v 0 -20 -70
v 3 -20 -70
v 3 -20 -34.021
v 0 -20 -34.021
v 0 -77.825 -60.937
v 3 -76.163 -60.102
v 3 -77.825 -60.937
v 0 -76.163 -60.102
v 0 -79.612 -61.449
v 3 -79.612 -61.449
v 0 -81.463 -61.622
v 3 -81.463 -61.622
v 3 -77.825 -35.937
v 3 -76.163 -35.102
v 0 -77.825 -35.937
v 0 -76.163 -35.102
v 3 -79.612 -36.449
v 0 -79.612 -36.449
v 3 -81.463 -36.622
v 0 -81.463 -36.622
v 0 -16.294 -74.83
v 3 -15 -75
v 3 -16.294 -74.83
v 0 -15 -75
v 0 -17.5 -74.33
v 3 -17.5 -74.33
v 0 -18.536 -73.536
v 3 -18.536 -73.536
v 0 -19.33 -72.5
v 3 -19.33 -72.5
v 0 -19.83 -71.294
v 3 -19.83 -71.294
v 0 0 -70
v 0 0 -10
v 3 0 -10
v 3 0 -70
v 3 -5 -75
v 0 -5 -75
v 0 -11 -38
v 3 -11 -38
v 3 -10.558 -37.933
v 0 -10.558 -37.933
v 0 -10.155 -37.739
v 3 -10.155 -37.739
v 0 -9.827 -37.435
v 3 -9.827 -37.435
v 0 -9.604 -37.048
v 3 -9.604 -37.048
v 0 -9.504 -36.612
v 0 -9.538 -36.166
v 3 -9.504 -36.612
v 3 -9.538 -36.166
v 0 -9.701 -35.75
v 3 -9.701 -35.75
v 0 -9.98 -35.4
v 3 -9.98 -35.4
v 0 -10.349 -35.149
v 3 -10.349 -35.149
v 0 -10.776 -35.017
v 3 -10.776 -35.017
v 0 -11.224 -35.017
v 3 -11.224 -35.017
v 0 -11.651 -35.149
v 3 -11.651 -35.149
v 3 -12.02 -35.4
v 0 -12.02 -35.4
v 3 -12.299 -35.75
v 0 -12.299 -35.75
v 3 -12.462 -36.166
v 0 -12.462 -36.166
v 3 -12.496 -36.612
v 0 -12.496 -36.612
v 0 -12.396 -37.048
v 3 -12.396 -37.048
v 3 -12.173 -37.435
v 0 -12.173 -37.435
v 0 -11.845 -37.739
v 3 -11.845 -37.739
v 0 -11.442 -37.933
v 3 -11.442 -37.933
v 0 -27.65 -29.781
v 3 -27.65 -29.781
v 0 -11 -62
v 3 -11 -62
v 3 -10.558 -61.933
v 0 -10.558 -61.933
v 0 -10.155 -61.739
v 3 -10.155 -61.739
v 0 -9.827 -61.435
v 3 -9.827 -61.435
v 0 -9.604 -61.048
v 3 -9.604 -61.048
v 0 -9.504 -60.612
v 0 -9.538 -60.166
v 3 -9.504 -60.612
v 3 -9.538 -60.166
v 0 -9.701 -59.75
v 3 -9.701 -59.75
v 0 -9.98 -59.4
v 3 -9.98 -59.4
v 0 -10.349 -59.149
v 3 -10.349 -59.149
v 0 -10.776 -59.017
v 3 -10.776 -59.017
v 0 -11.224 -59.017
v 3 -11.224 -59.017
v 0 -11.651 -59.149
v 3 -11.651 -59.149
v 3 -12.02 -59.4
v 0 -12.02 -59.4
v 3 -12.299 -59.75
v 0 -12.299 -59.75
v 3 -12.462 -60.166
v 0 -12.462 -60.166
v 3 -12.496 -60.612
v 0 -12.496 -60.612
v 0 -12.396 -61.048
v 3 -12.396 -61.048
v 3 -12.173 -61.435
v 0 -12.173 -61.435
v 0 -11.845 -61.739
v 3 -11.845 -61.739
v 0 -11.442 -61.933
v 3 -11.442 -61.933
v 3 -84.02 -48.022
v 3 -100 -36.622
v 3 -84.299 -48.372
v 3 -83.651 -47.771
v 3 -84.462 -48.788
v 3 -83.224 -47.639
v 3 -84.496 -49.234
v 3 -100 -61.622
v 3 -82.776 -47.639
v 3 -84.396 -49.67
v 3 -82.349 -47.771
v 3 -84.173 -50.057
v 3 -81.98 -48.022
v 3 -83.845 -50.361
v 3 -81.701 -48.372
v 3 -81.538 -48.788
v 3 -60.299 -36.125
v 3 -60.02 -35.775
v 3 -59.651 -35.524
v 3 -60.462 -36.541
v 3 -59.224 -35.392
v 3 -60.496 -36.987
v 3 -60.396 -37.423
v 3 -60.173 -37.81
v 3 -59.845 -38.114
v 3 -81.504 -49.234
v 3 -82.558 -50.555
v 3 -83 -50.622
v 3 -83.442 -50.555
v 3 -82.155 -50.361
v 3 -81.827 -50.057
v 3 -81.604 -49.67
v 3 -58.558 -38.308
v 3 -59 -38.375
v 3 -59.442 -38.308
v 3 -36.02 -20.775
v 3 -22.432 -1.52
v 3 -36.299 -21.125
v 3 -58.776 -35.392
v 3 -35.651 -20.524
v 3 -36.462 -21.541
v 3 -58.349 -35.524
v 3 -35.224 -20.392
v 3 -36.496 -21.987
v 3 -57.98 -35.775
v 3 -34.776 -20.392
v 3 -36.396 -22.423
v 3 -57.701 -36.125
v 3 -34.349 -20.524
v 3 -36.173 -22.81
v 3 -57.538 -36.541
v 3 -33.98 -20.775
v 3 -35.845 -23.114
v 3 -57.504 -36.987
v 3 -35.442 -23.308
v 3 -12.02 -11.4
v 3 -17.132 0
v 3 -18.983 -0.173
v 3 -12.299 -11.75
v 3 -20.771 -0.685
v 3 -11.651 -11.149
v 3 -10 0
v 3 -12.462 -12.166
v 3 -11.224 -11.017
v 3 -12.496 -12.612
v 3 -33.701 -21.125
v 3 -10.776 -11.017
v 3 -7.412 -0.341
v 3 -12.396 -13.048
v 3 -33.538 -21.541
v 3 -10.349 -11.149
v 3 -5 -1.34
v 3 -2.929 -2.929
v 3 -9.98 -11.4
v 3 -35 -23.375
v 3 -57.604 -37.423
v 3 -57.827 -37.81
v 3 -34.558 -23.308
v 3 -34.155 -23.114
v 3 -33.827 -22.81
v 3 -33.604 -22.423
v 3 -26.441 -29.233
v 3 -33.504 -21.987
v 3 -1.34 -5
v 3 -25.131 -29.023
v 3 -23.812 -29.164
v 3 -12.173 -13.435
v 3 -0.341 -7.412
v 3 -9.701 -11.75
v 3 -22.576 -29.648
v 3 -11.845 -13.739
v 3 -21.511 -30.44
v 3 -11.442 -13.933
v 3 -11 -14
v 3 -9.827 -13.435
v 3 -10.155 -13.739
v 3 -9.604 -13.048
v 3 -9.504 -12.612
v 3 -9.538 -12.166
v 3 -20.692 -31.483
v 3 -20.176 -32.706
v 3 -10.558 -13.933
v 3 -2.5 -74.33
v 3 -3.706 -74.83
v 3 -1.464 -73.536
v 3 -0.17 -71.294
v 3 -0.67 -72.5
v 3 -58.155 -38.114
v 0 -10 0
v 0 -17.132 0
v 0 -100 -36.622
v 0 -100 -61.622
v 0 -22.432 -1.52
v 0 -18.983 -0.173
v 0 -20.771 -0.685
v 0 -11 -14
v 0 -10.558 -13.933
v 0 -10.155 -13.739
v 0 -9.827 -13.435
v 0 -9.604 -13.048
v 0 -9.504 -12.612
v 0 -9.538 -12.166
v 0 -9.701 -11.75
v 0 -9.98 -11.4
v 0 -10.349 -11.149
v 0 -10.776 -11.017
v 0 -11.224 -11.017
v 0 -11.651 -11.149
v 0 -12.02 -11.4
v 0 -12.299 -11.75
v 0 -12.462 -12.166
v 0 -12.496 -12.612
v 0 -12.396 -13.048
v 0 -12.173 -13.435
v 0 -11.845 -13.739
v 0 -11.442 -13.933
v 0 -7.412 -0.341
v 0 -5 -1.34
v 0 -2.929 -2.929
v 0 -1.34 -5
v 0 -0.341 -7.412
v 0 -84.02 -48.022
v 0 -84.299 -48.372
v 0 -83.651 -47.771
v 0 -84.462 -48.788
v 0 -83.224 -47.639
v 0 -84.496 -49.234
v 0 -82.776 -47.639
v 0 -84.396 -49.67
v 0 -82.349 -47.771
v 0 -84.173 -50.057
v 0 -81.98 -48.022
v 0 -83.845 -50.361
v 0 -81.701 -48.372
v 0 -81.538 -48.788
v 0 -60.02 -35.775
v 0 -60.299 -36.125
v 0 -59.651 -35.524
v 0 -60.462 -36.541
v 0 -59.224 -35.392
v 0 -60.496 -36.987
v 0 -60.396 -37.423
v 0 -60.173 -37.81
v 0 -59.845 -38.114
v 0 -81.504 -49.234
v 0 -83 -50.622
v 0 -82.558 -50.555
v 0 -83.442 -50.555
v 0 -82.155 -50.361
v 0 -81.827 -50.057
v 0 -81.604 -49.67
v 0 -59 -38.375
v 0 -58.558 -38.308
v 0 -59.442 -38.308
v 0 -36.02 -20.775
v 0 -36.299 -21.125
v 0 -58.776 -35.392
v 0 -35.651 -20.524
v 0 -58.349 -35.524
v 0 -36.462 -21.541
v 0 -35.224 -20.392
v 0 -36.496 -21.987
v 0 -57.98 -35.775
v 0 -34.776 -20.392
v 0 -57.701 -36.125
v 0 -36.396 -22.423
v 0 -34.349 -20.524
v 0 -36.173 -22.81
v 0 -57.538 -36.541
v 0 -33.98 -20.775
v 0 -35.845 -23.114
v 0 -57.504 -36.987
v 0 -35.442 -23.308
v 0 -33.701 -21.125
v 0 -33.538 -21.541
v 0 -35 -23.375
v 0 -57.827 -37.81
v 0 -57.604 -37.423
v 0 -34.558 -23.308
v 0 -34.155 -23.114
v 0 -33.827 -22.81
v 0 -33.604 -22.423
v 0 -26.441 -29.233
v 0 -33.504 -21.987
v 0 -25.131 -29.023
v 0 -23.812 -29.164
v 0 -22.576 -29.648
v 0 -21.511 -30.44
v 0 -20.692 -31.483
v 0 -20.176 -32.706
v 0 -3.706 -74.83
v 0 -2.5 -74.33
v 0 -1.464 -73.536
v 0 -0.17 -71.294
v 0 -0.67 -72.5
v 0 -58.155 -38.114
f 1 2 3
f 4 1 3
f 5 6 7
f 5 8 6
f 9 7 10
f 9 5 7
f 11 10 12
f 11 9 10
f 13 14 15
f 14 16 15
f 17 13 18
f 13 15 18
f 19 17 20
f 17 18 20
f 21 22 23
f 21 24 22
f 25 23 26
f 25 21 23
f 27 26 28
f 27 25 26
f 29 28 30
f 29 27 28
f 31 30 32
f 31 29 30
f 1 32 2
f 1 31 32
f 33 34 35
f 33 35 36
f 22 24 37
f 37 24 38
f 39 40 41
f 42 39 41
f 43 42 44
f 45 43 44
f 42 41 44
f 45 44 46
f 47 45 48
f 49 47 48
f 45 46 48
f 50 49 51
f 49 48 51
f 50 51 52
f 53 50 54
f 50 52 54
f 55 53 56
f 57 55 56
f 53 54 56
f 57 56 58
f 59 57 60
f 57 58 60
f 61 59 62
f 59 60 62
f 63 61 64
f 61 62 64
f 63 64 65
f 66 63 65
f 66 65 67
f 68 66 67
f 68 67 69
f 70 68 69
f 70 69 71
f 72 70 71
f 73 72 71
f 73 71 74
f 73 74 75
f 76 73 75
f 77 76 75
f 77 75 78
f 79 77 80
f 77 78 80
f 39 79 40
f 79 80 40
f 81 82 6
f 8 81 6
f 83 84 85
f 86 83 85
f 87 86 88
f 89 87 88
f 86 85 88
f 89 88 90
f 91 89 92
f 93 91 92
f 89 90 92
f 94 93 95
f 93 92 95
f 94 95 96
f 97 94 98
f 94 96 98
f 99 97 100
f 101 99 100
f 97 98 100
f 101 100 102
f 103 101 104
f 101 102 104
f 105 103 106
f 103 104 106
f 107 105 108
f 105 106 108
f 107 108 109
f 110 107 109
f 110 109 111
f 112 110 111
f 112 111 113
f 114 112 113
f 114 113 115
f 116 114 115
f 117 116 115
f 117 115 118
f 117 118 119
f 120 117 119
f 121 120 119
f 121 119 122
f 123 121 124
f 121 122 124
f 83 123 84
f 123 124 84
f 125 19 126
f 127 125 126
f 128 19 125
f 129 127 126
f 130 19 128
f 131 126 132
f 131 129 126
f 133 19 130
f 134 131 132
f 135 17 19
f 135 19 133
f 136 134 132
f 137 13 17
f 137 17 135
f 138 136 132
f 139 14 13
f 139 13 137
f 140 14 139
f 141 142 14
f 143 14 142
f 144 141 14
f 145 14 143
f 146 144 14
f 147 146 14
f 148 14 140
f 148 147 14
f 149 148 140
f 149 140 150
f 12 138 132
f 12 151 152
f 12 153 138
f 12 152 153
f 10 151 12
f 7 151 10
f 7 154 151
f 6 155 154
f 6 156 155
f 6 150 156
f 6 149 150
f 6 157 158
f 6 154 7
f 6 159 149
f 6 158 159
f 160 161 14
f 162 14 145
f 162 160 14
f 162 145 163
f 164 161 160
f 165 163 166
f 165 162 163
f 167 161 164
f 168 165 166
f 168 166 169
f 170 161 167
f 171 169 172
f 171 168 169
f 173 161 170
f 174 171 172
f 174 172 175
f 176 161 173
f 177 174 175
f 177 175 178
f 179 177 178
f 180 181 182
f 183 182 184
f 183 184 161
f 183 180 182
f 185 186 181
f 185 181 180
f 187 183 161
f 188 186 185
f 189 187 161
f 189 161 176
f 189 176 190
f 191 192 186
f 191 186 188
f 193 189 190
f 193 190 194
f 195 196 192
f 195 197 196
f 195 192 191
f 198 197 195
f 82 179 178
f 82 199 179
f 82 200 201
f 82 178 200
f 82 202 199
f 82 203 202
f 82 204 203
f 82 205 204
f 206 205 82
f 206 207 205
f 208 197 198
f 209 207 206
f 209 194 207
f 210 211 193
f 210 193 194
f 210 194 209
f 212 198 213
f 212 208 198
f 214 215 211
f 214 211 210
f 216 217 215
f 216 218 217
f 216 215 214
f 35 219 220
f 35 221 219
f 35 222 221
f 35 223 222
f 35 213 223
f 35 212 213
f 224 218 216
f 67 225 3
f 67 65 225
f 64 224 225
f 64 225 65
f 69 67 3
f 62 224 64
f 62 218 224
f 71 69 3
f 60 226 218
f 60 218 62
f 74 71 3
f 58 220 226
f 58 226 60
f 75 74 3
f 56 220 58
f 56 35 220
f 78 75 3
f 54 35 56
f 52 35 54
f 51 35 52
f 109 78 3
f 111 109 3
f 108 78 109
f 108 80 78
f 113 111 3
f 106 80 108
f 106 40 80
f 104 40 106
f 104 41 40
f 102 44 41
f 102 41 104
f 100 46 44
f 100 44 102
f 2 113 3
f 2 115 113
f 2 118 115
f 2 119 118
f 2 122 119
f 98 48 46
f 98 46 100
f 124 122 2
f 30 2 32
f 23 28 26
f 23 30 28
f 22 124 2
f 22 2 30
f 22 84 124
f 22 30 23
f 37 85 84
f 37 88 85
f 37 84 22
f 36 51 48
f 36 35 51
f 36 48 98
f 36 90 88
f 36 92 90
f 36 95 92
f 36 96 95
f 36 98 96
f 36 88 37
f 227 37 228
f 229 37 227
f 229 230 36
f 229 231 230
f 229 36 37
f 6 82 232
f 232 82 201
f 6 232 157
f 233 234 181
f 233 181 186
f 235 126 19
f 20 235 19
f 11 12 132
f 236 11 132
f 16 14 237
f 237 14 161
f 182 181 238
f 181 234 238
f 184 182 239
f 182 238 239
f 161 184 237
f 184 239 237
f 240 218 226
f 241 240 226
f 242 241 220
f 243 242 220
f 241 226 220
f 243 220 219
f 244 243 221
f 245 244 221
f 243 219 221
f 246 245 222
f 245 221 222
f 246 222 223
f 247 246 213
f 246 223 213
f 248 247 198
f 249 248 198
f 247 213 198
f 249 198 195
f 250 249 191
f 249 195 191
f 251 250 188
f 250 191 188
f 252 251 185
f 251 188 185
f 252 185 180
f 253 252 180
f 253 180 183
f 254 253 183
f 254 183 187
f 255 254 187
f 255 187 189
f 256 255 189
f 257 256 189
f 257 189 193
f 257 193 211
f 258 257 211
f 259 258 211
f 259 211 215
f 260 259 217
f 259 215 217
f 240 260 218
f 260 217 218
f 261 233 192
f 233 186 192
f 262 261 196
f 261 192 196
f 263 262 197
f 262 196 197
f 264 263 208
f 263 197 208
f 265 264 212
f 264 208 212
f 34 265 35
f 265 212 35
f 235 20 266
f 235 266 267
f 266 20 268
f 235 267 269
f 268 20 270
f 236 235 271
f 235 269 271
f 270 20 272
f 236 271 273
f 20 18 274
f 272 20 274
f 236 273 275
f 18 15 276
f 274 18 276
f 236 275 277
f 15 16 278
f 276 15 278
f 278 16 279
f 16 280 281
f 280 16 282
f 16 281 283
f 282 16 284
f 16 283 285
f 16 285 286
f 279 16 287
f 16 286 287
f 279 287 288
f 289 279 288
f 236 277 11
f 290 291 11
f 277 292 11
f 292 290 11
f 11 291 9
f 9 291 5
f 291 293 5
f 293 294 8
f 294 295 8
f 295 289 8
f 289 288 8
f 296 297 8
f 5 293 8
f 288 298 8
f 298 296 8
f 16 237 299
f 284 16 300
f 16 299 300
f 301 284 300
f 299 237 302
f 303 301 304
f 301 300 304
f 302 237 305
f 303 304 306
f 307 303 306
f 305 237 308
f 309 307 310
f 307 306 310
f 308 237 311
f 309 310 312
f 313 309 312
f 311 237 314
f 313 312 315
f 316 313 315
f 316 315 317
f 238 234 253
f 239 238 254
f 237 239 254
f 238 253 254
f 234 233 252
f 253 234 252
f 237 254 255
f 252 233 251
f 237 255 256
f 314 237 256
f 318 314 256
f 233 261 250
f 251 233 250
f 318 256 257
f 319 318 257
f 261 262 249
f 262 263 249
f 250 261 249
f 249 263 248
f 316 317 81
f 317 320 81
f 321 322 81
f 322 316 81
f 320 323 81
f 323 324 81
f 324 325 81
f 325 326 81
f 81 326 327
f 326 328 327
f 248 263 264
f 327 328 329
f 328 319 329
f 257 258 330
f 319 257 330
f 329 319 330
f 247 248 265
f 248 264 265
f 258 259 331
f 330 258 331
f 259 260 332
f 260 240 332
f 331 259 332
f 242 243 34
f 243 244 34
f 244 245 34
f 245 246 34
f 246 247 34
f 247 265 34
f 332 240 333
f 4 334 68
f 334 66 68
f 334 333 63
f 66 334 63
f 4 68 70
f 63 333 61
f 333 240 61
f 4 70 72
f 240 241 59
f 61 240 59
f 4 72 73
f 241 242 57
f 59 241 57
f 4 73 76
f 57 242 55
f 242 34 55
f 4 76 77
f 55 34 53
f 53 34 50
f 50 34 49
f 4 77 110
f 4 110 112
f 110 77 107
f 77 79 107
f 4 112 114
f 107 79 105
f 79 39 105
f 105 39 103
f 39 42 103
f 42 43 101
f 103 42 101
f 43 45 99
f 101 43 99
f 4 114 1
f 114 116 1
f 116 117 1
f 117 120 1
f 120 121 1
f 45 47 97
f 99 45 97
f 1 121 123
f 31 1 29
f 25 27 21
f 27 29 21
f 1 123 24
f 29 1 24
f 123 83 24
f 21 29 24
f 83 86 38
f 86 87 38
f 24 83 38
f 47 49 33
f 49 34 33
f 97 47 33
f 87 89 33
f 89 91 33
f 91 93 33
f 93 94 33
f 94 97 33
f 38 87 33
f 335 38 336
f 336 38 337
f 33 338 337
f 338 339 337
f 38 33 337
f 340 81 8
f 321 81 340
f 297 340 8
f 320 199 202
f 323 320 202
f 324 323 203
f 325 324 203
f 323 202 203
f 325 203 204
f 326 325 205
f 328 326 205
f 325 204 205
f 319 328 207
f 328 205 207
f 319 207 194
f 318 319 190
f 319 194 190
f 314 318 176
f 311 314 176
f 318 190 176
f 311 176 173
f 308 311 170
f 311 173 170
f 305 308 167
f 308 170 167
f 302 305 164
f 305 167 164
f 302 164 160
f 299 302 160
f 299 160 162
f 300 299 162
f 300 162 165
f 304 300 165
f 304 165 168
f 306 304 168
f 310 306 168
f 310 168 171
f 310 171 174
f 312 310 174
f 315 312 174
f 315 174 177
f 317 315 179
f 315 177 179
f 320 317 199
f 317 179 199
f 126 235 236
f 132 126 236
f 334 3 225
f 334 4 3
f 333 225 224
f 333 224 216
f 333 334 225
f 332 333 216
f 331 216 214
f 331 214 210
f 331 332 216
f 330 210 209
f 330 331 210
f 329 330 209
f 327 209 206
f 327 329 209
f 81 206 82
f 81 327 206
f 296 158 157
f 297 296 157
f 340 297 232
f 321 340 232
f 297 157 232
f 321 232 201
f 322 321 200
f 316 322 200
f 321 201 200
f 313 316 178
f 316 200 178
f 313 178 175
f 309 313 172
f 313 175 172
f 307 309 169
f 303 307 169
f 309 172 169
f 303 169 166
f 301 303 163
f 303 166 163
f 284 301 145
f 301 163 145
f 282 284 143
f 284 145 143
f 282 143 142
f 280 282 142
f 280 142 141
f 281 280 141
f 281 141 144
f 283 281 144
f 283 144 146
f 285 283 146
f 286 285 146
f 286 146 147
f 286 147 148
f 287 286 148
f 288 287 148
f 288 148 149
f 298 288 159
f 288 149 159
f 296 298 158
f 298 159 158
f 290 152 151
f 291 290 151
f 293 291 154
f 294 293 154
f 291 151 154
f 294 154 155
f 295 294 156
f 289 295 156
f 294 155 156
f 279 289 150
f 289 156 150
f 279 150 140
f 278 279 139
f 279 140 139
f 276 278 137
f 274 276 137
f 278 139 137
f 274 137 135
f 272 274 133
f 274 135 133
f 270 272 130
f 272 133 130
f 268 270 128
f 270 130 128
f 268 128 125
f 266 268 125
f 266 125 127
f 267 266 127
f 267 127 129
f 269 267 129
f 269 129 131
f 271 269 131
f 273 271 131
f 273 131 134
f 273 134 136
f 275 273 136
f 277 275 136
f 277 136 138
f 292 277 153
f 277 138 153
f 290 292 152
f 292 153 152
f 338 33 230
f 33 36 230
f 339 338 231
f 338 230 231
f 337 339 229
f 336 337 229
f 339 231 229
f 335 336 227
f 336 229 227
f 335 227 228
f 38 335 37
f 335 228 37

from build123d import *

# Parameters (mm, degrees)
CROQUIS1_W              = 75
CROQUIS1_H              = 100
SALIENTE_EXTRUIR1_DEPTH = 3
CORTAR_EXTRUIR1_DEPTH   = 3
REDONDEO1_R             = 10
REDONDEO3_R             = 5
CROQUIS3_R              = 1.5
CORTAR_EXTRUIR2_DEPTH   = 3


with BuildPart() as part:
    # Croquis1 → Saliente-Extruir1 (new body)
    with BuildSketch(Plane(origin=(0, 0, 0), x_dir=(0, 0, -1), z_dir=(1, 0, 0))):
        with Locations((37.5, -50)):
            Rectangle(CROQUIS1_W, CROQUIS1_H)
    extrude(amount=SALIENTE_EXTRUIR1_DEPTH)

    # Croquis2 → Cortar-Extruir1 (cut)
    with BuildSketch(Plane(origin=(3, 0, 0), x_dir=(0, 0, -1), z_dir=(1, 0, 0))):
        Polygon((75, -20), (25, -20), (61.621978753, -78.595166005), (61.621978753, -100), (75, -100), align=None)
        Polygon((0, -100), (36.621978753, -100), (36.621978753, -78.595166005), (0, -20), align=None)
    extrude(amount=-CORTAR_EXTRUIR1_DEPTH, mode=Mode.SUBTRACT)

    # Redondeo1
    redondeo1_edges = [part.edges().sort_by_distance(p)[0] for p in [
        (1.5, -78.595166005, -61.621978753),
        (1.5, -20, 0),
        (1.5, -78.595166005, -36.621978753),
        (1.5, 0, 0),
    ]]
    fillet(redondeo1_edges, radius=REDONDEO1_R)

    # Redondeo3
    redondeo3_edges = [part.edges().sort_by_distance(p)[0] for p in [
        (1.5, -20, -25),
        (1.5, -20, -75),
        (1.5, 0, -75),
    ]]
    fillet(redondeo3_edges, radius=REDONDEO3_R)

    # Croquis3 → Cortar-Extruir2 (cut)
    with BuildSketch(Plane(origin=(3, 0, 0), x_dir=(0, 0, -1), z_dir=(1, 0, 0))):
        with Locations((12.5, -11)):
            Circle(CROQUIS3_R)
        with Locations((12.5, -83)):
            Circle(CROQUIS3_R)
        with Locations((36.5, -11)):
            Circle(CROQUIS3_R)
        with Locations((60.5, -11)):
            Circle(CROQUIS3_R)
        with Locations((21.875, -35)):
            Circle(CROQUIS3_R)
        with Locations((36.875, -59)):
            Circle(CROQUIS3_R)
        with Locations((49.121978753, -83)):
            Circle(CROQUIS3_R)
    extrude(amount=-CORTAR_EXTRUIR2_DEPTH, mode=Mode.SUBTRACT)


solid = part.part
